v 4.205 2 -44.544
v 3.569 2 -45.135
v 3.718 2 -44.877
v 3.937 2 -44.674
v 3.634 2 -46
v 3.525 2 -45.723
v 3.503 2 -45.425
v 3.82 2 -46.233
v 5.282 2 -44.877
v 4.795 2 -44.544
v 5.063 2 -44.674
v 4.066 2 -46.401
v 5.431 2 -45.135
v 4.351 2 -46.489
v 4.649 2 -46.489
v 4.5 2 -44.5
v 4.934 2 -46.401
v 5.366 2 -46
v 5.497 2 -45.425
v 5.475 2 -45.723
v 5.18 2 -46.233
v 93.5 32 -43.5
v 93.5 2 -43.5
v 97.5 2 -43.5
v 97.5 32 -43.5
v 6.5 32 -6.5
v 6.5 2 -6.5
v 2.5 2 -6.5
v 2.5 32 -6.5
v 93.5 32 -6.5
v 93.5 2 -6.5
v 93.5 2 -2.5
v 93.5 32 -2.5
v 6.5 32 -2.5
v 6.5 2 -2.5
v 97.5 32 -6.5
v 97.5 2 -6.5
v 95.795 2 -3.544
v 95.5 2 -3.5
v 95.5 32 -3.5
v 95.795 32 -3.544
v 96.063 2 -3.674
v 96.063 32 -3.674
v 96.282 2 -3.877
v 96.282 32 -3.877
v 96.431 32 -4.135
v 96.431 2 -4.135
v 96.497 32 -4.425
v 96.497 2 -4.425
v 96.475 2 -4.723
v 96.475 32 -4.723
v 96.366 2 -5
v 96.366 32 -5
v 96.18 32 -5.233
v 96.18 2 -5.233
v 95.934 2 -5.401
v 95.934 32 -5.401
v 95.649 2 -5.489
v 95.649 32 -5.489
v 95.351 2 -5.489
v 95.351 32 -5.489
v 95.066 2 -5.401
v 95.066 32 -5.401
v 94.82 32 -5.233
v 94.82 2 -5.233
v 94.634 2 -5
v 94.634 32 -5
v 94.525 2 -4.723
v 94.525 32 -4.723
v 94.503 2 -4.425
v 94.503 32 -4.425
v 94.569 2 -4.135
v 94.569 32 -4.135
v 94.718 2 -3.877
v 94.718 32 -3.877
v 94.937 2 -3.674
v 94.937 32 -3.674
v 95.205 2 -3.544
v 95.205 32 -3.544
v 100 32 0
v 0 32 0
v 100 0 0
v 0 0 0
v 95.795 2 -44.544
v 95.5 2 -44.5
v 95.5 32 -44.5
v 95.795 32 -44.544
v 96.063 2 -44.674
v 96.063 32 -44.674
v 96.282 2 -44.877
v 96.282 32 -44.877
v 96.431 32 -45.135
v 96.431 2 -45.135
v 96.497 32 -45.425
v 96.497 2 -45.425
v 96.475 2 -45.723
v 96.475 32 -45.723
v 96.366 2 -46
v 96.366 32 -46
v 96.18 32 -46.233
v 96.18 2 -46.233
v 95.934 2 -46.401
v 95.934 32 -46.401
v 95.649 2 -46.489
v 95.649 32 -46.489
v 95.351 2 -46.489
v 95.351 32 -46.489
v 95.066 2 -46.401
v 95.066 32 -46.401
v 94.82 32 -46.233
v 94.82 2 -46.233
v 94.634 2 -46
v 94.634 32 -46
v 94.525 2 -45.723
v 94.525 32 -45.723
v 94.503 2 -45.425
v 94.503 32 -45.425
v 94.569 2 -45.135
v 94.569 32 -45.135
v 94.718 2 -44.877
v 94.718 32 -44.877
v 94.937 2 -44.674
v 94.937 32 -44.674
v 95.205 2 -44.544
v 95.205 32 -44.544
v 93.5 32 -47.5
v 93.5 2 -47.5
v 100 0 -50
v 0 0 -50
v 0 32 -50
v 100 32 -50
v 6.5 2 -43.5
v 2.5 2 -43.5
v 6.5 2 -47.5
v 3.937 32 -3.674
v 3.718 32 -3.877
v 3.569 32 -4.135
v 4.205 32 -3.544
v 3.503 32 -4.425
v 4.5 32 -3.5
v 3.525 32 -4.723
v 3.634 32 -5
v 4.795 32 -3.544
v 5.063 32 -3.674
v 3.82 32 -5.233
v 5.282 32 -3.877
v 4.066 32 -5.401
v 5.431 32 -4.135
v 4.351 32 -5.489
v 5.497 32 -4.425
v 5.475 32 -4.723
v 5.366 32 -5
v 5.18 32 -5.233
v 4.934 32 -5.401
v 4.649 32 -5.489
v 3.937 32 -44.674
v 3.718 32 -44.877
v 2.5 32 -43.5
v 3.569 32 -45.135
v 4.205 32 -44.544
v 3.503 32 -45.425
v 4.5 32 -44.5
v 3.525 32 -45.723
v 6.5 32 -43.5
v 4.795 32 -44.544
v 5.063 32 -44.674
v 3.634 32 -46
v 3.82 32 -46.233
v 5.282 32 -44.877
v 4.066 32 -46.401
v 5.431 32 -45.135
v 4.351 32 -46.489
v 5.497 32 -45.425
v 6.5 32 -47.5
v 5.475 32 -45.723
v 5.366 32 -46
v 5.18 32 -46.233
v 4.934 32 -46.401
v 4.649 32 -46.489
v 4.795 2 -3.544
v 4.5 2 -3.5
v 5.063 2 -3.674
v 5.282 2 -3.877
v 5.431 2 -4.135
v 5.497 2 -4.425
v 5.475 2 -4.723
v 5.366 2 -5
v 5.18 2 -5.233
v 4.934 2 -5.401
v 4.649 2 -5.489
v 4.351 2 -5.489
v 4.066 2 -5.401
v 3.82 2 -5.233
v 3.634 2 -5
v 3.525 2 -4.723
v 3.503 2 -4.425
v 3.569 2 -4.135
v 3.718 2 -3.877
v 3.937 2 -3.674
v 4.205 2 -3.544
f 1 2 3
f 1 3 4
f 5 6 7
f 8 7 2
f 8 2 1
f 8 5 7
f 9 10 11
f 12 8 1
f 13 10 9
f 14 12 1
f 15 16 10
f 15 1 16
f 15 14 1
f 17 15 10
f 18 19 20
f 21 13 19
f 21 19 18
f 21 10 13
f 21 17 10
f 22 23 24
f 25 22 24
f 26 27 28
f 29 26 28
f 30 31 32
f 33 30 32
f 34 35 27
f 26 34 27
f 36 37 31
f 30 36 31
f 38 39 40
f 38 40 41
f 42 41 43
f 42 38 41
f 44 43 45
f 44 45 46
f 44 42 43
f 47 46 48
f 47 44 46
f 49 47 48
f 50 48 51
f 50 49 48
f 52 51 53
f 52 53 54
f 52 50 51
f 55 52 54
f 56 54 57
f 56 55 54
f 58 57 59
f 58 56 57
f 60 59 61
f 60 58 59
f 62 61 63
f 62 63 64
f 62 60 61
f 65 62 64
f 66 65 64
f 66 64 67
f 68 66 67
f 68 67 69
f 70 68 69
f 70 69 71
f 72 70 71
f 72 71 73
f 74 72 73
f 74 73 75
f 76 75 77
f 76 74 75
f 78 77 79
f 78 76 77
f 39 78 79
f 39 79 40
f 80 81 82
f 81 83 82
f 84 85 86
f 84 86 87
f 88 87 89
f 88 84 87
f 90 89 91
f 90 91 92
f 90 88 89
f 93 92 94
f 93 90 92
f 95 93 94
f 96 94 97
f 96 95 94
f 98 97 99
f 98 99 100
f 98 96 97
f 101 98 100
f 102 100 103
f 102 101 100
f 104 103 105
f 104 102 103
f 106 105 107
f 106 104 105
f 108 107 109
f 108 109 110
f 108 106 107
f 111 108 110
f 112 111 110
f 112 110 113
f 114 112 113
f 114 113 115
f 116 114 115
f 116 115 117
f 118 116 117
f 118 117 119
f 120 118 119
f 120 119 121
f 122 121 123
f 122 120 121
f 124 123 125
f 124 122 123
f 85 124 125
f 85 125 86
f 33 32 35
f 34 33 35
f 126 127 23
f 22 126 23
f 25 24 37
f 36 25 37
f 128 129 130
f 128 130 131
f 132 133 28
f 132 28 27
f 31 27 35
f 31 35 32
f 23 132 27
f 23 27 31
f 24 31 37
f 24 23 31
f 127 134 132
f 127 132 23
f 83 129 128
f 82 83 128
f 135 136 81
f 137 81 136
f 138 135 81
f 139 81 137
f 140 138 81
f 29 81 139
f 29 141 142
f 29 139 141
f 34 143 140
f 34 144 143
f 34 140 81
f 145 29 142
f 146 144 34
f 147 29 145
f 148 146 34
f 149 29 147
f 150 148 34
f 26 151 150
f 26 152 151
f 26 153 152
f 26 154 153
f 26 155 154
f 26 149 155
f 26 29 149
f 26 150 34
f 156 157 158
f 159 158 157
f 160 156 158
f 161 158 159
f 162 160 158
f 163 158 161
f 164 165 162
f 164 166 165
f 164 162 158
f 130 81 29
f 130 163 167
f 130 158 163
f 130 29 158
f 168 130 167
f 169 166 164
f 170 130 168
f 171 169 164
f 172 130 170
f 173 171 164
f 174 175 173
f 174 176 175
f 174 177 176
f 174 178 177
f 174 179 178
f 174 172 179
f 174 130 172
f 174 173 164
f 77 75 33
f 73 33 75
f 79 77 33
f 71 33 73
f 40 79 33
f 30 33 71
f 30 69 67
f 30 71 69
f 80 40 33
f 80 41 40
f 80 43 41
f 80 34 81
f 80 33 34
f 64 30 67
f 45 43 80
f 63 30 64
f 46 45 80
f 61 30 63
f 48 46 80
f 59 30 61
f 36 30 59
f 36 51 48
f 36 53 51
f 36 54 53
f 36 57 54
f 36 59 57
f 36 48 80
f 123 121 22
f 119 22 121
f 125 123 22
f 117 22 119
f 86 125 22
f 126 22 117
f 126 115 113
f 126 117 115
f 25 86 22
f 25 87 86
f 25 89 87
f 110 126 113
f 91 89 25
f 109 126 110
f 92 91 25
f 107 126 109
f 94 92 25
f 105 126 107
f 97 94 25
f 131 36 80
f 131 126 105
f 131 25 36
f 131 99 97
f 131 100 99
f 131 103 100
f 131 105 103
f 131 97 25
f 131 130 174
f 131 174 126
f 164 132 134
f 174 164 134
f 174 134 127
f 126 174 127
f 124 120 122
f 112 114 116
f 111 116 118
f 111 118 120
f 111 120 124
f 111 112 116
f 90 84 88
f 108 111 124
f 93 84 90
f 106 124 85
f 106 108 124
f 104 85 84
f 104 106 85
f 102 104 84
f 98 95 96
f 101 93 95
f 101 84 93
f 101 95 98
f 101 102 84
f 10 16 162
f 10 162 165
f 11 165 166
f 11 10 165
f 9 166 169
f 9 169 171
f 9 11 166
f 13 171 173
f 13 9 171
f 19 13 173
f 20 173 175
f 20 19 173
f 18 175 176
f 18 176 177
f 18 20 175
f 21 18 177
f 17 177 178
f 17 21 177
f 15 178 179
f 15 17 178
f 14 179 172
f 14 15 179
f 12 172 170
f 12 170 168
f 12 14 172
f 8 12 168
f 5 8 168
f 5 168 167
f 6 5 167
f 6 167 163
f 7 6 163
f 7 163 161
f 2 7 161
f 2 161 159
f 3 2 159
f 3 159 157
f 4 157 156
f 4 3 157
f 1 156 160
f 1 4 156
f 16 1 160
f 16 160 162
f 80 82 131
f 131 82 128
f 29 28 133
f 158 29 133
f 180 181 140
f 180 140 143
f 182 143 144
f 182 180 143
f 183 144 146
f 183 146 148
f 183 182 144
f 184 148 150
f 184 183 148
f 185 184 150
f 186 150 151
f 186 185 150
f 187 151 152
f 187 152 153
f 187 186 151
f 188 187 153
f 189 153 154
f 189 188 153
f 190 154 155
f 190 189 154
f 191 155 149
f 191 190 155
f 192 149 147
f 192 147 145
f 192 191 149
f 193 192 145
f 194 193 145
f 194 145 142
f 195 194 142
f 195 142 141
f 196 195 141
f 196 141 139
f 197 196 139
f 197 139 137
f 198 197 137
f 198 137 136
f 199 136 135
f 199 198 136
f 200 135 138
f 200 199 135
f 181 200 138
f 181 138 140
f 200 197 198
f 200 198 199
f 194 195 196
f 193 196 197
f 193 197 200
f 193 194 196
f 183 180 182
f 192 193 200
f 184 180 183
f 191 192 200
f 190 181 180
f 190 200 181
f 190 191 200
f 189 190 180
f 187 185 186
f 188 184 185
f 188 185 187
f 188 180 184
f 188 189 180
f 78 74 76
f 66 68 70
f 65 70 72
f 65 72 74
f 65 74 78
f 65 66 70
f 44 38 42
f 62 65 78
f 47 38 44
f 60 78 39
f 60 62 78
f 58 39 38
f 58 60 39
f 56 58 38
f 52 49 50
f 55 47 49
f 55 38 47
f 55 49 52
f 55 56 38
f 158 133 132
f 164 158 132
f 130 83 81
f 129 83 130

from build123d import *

# Parameters (mm, degrees)
SKETCH1_W           = 100
SKETCH1_H           = 50
BOSS_EXTRUDE1_DEPTH = 2
SKETCH3_W           = 100
SKETCH3_H           = 50
SKETCH3_R           = 1
BOSS_EXTRUDE2_DEPTH = 30


with BuildPart() as part:
    # Sketch1 → Boss-Extrude1 (new body)
    with BuildSketch(Plane(origin=(0, 0, 0), x_dir=(1, 0, 0), z_dir=(0, 1, 0))):
        with Locations((50, 25)):
            Rectangle(SKETCH1_W, SKETCH1_H)
    extrude(amount=BOSS_EXTRUDE1_DEPTH)

    # Sketch3 → Boss-Extrude2 (add)
    with BuildSketch(Plane(origin=(0, 2, 0), x_dir=(1, 0, 0), z_dir=(0, 1, 0))):
        with Locations((50, 25)):
            Rectangle(SKETCH3_W, SKETCH3_H)
        with Locations(Location((4.5, 45.5, 0), (0, 0, 270))):
            Circle(SKETCH3_R, mode=Mode.SUBTRACT)
        with Locations(Location((95.5, 45.5, 0), (0, 0, 270))):
            Circle(SKETCH3_R, mode=Mode.SUBTRACT)
        with Locations(Location((95.5, 4.5, 0), (0, 0, 270))):
            Circle(SKETCH3_R, mode=Mode.SUBTRACT)
        with Locations(Location((4.5, 4.5, 0), (0, 0, 270))):
            Circle(SKETCH3_R, mode=Mode.SUBTRACT)
        Polygon((6.5, 47.5), (93.5, 47.5), (93.5, 43.5), (97.5, 43.5), (97.5, 6.5), (93.5, 6.5), (93.5, 2.5), (6.5, 2.5), (6.5, 6.5), (2.5, 6.5), (2.5, 43.5), (6.5, 43.5), align=None, mode=Mode.SUBTRACT)
    extrude(amount=BOSS_EXTRUDE2_DEPTH)


solid = part.part
